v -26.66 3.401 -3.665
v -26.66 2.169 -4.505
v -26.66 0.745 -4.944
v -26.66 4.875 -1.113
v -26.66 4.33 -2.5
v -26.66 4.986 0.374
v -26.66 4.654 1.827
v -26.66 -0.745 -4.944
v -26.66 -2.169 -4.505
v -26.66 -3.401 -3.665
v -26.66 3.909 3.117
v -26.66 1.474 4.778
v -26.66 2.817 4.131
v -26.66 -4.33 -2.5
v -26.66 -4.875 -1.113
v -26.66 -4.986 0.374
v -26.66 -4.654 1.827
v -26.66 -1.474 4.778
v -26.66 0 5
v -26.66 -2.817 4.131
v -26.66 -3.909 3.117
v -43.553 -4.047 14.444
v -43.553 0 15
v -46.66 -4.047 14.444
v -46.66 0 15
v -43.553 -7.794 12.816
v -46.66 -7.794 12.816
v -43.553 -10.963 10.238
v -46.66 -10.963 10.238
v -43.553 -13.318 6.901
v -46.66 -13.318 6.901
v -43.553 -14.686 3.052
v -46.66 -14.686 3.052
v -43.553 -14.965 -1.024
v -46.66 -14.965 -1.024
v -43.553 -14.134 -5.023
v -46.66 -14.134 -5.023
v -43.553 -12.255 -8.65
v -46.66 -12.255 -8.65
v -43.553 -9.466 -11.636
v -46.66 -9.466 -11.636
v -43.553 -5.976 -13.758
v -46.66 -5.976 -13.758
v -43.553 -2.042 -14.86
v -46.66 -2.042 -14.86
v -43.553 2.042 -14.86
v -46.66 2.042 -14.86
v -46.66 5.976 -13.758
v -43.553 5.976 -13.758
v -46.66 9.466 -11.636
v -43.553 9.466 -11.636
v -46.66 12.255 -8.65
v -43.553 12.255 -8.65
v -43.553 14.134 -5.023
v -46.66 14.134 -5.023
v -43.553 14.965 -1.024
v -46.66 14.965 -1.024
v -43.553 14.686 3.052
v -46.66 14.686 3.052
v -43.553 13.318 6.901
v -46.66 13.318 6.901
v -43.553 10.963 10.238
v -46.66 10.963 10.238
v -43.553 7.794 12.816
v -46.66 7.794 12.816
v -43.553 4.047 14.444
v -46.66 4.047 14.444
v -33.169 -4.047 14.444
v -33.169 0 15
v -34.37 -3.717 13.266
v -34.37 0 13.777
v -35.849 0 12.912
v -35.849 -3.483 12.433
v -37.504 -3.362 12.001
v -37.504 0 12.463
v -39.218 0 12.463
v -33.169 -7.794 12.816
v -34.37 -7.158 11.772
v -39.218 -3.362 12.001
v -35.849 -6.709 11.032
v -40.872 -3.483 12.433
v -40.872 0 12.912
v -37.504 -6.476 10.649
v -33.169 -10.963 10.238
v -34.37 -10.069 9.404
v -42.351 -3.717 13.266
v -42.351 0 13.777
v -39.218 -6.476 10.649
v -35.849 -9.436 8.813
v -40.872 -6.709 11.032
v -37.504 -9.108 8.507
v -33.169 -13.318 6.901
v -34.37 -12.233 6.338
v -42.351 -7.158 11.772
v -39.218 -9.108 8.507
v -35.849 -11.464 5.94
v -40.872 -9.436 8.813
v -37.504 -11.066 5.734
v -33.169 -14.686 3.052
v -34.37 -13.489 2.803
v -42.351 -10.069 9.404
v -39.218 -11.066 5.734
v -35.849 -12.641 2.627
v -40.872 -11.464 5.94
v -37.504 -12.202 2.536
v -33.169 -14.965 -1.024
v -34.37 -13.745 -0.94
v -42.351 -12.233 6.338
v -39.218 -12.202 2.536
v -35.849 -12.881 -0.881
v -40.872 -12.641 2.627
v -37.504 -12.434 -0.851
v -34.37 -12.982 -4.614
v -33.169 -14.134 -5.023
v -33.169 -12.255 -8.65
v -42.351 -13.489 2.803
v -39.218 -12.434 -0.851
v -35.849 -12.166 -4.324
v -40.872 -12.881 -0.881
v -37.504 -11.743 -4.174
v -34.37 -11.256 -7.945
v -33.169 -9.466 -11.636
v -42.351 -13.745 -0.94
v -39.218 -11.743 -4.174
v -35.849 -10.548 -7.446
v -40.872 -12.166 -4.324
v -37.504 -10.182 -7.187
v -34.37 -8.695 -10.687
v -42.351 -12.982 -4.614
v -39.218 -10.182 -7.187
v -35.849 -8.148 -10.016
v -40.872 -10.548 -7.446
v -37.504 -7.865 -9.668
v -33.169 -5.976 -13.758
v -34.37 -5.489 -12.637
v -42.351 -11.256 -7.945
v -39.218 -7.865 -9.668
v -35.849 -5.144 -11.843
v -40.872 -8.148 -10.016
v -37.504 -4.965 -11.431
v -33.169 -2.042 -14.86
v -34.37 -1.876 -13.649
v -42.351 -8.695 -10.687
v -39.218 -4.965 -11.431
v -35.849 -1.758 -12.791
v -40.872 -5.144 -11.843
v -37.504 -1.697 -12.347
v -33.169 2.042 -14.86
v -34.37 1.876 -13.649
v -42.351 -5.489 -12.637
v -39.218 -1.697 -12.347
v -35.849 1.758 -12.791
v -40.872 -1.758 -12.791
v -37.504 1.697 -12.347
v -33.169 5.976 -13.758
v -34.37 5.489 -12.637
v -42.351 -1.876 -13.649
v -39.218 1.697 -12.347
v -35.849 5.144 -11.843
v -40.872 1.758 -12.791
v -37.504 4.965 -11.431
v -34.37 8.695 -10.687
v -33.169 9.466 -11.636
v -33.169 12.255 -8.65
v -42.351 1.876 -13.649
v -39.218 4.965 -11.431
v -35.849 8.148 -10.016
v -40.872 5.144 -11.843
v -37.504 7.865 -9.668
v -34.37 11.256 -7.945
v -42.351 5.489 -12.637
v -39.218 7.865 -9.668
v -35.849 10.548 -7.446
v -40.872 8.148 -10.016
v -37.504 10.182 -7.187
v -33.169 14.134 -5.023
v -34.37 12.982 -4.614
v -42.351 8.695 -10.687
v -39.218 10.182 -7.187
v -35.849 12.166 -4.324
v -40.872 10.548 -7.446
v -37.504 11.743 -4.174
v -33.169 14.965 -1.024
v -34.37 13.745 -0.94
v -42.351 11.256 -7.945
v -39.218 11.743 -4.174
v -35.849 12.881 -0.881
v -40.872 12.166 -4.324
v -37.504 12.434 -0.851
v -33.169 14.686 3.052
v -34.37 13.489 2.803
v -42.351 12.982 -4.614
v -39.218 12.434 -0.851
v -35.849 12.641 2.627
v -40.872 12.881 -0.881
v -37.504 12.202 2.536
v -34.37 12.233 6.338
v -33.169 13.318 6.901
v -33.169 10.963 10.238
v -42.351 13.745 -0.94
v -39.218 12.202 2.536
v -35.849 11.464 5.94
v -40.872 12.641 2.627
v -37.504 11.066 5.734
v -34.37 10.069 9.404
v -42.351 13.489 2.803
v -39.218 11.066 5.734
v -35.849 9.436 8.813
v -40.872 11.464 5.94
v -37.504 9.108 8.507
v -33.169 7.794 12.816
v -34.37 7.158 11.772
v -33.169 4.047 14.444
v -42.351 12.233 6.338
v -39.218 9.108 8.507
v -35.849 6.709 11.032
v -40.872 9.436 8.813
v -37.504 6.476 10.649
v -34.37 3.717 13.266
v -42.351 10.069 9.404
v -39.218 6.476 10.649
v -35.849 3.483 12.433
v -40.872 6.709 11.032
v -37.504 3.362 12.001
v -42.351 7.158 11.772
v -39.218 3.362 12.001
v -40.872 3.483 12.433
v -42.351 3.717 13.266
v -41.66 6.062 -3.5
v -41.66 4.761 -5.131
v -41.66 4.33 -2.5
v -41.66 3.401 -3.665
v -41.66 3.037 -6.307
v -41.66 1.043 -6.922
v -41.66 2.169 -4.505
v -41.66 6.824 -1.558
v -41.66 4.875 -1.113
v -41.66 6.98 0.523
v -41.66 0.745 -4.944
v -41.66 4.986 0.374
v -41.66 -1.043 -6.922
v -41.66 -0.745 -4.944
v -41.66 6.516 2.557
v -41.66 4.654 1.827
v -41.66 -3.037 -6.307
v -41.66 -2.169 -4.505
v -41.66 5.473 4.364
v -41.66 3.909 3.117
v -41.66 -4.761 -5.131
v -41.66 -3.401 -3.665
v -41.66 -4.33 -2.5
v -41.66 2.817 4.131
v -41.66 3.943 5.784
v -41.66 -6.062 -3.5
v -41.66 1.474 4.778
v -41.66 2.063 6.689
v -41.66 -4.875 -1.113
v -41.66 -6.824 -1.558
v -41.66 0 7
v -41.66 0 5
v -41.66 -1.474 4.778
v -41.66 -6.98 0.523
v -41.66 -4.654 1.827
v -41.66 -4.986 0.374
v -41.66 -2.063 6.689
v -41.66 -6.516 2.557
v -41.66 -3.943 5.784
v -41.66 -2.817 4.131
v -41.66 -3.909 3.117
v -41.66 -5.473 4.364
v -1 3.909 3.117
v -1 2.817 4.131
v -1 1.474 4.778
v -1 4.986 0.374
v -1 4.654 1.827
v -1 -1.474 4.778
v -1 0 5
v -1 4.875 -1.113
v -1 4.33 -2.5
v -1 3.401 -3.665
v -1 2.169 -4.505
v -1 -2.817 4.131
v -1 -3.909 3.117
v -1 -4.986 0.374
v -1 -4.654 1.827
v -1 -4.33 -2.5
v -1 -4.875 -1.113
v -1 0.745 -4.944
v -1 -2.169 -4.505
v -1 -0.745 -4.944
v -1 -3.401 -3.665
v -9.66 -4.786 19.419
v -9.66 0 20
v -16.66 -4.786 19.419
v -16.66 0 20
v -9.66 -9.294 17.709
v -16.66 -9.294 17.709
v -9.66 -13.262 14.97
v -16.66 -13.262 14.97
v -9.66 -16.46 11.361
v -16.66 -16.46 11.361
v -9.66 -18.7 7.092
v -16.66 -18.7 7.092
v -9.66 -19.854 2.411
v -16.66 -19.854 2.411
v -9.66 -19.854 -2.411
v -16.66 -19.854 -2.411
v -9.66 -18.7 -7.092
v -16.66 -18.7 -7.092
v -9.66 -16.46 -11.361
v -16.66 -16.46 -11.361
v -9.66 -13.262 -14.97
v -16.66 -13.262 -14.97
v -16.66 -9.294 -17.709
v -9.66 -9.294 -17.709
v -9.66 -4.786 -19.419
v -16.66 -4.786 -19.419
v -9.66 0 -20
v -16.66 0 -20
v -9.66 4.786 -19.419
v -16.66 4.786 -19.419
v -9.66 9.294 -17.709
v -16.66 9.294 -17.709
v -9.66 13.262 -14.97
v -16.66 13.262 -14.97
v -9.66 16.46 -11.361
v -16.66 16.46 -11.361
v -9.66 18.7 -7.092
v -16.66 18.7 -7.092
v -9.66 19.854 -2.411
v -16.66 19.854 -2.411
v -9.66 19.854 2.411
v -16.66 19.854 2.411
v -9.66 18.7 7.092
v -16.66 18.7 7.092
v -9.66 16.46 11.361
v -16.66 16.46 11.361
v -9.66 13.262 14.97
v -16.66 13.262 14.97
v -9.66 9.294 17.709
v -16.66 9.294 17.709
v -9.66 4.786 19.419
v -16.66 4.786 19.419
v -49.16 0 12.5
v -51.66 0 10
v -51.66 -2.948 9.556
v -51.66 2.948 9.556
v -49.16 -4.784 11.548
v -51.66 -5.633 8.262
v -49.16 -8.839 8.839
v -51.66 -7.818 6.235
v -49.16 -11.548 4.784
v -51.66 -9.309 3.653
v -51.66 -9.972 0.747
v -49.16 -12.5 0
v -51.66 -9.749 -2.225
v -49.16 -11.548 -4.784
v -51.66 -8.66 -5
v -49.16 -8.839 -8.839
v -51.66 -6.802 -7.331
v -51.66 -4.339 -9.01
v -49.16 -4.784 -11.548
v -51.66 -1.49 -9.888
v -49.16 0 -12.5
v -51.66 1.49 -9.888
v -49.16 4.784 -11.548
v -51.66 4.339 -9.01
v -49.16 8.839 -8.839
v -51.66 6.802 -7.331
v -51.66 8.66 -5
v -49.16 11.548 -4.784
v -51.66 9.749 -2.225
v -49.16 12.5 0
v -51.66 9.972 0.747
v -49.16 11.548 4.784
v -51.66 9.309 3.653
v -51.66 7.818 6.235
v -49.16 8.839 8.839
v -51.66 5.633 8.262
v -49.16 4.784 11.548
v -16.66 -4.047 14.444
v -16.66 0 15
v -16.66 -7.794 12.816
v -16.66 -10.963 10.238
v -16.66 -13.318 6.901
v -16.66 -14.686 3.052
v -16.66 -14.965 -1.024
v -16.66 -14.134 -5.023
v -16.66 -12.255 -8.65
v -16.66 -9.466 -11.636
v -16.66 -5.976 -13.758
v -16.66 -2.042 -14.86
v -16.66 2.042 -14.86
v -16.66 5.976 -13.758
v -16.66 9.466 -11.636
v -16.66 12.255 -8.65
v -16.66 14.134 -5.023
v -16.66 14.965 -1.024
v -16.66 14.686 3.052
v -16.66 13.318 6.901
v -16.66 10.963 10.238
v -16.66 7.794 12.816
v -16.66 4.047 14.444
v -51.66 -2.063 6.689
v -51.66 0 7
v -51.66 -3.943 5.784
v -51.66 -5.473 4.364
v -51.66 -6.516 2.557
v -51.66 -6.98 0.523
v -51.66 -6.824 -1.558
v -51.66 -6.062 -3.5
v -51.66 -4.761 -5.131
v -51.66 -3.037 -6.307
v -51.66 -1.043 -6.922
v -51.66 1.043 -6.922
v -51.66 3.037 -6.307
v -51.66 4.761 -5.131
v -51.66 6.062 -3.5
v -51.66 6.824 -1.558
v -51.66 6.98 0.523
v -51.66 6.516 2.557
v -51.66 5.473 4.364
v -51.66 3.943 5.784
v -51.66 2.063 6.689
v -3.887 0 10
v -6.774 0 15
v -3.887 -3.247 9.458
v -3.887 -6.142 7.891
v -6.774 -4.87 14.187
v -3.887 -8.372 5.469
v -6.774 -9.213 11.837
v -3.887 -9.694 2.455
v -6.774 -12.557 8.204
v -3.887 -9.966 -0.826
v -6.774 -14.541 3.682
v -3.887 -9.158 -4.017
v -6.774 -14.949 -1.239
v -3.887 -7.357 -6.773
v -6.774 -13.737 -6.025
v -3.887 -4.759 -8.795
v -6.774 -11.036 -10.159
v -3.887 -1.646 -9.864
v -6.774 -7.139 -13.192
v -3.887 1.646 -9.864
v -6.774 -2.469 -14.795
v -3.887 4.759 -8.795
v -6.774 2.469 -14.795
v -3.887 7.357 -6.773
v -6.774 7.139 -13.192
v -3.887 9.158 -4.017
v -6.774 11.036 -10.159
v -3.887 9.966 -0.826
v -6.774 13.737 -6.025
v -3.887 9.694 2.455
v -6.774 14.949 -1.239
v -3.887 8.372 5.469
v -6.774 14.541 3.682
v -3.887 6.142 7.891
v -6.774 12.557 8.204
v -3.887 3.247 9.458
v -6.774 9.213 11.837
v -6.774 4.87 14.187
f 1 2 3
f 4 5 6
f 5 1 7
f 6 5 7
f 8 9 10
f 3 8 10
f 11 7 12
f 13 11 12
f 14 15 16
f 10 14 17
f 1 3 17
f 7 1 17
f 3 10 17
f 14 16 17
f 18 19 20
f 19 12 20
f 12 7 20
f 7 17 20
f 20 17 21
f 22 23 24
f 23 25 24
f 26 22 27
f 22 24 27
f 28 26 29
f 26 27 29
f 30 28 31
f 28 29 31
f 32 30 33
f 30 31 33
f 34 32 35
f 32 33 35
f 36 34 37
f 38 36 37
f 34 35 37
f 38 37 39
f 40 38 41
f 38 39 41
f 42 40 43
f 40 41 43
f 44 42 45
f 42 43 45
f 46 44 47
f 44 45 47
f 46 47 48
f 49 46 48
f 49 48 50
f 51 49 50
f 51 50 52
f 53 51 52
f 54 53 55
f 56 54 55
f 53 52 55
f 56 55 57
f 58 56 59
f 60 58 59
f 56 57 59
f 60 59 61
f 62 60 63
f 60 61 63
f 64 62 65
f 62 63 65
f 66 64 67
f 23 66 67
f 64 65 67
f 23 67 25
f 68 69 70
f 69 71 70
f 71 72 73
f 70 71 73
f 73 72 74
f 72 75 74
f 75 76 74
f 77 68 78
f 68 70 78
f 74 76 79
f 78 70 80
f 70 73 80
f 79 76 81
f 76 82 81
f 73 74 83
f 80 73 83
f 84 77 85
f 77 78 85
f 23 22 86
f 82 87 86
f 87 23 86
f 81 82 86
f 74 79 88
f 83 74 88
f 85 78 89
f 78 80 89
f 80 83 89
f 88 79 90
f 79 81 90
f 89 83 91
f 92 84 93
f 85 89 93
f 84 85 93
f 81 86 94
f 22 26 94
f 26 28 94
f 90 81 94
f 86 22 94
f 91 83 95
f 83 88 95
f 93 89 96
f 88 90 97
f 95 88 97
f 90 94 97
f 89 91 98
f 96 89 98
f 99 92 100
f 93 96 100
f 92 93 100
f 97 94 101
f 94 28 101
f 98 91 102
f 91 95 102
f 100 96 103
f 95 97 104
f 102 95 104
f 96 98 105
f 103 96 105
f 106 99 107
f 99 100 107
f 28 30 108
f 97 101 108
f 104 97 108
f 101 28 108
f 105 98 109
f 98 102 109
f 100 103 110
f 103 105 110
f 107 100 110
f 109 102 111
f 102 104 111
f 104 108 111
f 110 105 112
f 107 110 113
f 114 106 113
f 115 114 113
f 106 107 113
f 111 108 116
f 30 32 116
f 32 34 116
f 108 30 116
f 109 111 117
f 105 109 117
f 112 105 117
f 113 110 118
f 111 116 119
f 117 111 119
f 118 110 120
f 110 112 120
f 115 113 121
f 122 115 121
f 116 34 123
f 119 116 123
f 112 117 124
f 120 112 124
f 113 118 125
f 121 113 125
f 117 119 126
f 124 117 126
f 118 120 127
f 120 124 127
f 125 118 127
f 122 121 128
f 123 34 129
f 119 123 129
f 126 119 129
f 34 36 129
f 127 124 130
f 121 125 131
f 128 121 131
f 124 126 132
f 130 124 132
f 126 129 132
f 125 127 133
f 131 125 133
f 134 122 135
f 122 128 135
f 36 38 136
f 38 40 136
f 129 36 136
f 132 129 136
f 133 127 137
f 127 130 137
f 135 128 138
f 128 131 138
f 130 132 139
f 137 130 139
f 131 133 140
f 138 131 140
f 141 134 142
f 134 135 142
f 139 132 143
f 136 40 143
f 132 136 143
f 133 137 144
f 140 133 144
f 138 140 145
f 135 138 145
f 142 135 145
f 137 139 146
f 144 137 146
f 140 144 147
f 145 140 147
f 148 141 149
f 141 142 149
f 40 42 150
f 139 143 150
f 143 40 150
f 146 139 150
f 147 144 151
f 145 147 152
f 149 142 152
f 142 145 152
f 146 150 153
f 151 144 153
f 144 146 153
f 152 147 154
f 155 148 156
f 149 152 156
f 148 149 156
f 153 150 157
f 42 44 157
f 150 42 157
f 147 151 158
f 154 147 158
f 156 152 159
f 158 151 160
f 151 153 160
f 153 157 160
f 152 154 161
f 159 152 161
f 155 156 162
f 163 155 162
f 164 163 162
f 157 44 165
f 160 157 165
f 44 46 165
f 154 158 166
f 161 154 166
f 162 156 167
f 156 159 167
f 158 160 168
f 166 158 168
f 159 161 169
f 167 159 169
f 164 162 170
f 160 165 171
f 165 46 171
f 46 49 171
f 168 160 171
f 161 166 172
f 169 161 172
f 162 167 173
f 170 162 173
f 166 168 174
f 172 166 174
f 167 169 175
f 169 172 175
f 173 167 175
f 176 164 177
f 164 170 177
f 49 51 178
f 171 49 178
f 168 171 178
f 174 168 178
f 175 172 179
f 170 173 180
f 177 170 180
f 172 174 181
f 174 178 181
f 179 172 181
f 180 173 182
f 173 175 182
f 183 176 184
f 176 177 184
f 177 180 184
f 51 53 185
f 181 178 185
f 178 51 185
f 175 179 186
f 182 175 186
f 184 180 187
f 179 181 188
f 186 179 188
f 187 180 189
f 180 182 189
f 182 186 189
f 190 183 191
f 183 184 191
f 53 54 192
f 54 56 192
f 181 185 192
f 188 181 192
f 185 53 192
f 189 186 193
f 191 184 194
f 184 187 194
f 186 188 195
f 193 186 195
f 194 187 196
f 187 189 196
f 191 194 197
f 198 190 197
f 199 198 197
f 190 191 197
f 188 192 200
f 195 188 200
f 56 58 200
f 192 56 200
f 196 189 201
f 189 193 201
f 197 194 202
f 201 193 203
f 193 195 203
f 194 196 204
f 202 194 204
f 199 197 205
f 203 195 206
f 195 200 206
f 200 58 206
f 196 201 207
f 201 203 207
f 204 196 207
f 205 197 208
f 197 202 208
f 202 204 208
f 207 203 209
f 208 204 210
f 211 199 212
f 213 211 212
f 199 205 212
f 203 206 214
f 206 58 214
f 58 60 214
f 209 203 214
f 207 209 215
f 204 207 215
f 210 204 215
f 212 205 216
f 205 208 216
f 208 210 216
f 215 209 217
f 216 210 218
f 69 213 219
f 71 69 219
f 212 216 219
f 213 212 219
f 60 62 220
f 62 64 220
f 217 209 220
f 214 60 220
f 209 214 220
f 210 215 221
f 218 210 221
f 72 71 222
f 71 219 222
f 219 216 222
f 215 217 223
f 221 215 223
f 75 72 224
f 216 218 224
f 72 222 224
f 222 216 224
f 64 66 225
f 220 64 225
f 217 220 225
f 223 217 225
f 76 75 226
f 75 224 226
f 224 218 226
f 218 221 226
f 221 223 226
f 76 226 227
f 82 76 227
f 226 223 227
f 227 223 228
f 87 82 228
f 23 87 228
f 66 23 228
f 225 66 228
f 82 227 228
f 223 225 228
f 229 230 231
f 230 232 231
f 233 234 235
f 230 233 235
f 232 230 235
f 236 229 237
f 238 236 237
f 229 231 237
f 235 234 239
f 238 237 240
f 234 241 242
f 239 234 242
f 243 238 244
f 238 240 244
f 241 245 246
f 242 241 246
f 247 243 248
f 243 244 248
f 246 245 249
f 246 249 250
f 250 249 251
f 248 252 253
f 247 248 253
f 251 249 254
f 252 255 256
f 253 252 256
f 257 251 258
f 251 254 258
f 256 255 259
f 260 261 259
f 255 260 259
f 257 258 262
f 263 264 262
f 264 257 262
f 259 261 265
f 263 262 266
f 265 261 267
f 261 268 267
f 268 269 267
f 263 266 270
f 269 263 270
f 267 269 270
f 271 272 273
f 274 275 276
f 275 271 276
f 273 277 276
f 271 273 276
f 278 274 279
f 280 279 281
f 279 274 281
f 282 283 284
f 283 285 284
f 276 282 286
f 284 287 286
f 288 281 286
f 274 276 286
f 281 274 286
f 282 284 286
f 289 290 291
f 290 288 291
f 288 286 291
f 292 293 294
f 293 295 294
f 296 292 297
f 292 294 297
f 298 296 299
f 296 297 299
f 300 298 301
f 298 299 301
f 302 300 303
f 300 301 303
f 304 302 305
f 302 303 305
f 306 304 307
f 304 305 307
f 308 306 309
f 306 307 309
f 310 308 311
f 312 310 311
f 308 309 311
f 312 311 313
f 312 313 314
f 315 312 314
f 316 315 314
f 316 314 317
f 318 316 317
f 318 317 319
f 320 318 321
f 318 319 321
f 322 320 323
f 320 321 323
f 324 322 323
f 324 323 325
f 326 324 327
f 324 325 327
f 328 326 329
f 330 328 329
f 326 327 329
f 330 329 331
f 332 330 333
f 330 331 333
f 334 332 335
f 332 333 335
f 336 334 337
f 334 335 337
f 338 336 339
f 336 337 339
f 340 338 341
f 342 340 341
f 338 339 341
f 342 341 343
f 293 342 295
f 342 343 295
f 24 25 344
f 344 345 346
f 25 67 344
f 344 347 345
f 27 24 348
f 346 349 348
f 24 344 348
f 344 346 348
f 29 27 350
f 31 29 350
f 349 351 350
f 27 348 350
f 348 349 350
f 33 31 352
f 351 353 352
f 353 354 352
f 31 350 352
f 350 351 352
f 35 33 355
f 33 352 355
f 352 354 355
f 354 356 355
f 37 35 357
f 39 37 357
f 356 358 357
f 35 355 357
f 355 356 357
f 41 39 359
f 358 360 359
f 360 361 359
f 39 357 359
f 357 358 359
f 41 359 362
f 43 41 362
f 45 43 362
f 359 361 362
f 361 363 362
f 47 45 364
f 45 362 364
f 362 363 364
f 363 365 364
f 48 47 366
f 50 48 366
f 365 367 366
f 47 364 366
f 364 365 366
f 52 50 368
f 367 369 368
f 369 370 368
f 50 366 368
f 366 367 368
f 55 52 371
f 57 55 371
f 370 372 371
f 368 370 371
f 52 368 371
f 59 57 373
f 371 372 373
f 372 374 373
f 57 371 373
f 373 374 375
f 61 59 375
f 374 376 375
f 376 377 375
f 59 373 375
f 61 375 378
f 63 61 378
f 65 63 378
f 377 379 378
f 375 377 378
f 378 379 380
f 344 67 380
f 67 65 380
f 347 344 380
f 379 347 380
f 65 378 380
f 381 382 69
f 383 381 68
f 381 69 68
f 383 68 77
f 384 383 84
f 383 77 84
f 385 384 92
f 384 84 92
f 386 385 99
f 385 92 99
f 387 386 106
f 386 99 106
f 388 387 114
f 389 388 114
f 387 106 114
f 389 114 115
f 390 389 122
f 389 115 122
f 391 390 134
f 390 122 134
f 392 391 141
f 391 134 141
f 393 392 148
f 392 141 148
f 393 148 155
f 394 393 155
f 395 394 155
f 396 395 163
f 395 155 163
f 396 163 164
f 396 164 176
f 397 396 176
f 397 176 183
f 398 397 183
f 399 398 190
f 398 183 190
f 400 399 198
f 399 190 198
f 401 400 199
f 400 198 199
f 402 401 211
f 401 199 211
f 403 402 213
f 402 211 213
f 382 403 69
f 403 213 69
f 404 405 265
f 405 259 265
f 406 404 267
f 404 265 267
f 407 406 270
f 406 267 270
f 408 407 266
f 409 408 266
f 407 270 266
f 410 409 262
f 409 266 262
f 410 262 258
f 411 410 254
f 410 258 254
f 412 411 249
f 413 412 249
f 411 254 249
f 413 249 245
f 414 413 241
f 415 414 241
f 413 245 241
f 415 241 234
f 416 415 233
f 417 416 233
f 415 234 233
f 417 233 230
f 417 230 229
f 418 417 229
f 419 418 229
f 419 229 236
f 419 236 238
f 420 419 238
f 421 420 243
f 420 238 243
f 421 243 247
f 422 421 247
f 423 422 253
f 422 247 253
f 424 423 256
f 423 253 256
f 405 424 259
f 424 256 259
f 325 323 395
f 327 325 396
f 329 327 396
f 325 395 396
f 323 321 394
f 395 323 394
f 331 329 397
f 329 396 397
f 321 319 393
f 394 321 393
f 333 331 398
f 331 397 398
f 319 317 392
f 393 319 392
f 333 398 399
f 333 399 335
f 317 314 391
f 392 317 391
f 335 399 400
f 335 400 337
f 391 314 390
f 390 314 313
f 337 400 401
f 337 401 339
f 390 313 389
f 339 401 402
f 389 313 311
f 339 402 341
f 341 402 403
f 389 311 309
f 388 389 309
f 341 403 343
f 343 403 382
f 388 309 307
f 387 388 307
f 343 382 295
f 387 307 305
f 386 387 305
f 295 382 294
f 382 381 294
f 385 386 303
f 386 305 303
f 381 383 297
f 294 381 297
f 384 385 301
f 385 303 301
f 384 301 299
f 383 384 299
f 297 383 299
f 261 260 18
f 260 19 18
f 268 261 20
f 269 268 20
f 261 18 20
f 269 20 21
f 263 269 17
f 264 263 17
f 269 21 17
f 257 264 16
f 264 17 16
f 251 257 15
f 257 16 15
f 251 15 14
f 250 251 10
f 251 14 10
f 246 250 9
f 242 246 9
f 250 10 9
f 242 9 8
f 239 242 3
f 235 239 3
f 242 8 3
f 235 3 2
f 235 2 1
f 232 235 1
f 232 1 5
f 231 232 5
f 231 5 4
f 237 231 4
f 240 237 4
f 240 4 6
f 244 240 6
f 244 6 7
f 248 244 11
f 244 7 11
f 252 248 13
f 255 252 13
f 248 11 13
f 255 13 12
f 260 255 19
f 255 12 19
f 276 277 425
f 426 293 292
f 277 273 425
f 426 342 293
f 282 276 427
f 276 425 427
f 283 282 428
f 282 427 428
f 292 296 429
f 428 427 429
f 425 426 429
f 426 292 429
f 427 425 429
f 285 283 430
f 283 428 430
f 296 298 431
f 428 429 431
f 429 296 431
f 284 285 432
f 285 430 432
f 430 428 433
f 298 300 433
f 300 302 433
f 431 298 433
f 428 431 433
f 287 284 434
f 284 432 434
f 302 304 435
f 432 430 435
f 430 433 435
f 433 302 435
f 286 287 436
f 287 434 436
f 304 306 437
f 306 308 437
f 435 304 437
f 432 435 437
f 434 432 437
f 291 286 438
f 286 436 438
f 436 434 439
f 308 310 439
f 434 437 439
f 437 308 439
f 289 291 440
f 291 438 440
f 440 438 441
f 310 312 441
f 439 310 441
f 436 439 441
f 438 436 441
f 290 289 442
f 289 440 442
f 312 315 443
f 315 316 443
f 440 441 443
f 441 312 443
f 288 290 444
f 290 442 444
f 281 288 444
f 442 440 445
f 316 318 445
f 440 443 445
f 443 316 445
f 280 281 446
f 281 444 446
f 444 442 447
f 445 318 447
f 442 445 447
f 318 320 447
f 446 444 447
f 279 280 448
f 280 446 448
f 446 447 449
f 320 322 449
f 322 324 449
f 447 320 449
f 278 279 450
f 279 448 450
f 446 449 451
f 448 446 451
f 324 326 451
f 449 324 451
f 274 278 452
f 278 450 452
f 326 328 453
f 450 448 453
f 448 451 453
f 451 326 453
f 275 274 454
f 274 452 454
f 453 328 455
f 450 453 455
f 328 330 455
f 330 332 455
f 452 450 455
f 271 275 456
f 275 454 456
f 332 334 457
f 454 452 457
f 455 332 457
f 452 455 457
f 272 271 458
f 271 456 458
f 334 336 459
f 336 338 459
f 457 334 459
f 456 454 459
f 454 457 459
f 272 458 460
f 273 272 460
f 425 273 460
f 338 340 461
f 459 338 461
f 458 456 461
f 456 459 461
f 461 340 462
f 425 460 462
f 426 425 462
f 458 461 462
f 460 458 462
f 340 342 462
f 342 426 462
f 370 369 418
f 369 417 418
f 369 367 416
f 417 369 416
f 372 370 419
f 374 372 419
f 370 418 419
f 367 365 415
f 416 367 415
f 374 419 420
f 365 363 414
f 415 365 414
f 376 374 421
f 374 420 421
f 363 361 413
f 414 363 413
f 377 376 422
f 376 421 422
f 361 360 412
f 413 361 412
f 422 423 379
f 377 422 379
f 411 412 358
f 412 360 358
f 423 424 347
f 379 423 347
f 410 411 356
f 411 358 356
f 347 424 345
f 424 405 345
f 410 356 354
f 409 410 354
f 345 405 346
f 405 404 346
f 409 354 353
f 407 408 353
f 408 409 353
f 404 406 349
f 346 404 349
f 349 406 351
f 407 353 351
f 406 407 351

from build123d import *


with BuildPart() as f1:
    # F0 (on Front) → F1 (revolve)
    with BuildSketch(Plane.XZ):
        with BuildLine():
            Line((-26.660254, 0), (-1, 0))
            Line((-1, 0), (-1, 5))
            Line((-1, 5), (-9.660254, 20))
            Line((-9.660254, 20), (-16.660254, 20))
            Line((-16.660254, 20), (-16.660254, 15))
            Line((-16.660254, 15), (-33.168647, 15))
            ThreePointArc((-33.168647, 15), (-38.360685, 12.40621), (-43.552724, 15))
            Line((-43.552724, 15), (-46.660254, 15))
            Line((-46.660254, 15), (-51.660254, 10))
            Line((-51.660254, 10), (-51.660254, 7))
            Line((-51.660254, 7), (-41.660254, 7))
            Line((-41.660254, 7), (-41.660254, 5))
            Line((-41.660254, 5), (-26.660254, 5))
            Line((-26.660254, 5), (-26.660254, 0))
        make_face()
    revolve(axis=Axis((-30.367628, 0, 0), (1, 0, 0)))


solid = f1.part
